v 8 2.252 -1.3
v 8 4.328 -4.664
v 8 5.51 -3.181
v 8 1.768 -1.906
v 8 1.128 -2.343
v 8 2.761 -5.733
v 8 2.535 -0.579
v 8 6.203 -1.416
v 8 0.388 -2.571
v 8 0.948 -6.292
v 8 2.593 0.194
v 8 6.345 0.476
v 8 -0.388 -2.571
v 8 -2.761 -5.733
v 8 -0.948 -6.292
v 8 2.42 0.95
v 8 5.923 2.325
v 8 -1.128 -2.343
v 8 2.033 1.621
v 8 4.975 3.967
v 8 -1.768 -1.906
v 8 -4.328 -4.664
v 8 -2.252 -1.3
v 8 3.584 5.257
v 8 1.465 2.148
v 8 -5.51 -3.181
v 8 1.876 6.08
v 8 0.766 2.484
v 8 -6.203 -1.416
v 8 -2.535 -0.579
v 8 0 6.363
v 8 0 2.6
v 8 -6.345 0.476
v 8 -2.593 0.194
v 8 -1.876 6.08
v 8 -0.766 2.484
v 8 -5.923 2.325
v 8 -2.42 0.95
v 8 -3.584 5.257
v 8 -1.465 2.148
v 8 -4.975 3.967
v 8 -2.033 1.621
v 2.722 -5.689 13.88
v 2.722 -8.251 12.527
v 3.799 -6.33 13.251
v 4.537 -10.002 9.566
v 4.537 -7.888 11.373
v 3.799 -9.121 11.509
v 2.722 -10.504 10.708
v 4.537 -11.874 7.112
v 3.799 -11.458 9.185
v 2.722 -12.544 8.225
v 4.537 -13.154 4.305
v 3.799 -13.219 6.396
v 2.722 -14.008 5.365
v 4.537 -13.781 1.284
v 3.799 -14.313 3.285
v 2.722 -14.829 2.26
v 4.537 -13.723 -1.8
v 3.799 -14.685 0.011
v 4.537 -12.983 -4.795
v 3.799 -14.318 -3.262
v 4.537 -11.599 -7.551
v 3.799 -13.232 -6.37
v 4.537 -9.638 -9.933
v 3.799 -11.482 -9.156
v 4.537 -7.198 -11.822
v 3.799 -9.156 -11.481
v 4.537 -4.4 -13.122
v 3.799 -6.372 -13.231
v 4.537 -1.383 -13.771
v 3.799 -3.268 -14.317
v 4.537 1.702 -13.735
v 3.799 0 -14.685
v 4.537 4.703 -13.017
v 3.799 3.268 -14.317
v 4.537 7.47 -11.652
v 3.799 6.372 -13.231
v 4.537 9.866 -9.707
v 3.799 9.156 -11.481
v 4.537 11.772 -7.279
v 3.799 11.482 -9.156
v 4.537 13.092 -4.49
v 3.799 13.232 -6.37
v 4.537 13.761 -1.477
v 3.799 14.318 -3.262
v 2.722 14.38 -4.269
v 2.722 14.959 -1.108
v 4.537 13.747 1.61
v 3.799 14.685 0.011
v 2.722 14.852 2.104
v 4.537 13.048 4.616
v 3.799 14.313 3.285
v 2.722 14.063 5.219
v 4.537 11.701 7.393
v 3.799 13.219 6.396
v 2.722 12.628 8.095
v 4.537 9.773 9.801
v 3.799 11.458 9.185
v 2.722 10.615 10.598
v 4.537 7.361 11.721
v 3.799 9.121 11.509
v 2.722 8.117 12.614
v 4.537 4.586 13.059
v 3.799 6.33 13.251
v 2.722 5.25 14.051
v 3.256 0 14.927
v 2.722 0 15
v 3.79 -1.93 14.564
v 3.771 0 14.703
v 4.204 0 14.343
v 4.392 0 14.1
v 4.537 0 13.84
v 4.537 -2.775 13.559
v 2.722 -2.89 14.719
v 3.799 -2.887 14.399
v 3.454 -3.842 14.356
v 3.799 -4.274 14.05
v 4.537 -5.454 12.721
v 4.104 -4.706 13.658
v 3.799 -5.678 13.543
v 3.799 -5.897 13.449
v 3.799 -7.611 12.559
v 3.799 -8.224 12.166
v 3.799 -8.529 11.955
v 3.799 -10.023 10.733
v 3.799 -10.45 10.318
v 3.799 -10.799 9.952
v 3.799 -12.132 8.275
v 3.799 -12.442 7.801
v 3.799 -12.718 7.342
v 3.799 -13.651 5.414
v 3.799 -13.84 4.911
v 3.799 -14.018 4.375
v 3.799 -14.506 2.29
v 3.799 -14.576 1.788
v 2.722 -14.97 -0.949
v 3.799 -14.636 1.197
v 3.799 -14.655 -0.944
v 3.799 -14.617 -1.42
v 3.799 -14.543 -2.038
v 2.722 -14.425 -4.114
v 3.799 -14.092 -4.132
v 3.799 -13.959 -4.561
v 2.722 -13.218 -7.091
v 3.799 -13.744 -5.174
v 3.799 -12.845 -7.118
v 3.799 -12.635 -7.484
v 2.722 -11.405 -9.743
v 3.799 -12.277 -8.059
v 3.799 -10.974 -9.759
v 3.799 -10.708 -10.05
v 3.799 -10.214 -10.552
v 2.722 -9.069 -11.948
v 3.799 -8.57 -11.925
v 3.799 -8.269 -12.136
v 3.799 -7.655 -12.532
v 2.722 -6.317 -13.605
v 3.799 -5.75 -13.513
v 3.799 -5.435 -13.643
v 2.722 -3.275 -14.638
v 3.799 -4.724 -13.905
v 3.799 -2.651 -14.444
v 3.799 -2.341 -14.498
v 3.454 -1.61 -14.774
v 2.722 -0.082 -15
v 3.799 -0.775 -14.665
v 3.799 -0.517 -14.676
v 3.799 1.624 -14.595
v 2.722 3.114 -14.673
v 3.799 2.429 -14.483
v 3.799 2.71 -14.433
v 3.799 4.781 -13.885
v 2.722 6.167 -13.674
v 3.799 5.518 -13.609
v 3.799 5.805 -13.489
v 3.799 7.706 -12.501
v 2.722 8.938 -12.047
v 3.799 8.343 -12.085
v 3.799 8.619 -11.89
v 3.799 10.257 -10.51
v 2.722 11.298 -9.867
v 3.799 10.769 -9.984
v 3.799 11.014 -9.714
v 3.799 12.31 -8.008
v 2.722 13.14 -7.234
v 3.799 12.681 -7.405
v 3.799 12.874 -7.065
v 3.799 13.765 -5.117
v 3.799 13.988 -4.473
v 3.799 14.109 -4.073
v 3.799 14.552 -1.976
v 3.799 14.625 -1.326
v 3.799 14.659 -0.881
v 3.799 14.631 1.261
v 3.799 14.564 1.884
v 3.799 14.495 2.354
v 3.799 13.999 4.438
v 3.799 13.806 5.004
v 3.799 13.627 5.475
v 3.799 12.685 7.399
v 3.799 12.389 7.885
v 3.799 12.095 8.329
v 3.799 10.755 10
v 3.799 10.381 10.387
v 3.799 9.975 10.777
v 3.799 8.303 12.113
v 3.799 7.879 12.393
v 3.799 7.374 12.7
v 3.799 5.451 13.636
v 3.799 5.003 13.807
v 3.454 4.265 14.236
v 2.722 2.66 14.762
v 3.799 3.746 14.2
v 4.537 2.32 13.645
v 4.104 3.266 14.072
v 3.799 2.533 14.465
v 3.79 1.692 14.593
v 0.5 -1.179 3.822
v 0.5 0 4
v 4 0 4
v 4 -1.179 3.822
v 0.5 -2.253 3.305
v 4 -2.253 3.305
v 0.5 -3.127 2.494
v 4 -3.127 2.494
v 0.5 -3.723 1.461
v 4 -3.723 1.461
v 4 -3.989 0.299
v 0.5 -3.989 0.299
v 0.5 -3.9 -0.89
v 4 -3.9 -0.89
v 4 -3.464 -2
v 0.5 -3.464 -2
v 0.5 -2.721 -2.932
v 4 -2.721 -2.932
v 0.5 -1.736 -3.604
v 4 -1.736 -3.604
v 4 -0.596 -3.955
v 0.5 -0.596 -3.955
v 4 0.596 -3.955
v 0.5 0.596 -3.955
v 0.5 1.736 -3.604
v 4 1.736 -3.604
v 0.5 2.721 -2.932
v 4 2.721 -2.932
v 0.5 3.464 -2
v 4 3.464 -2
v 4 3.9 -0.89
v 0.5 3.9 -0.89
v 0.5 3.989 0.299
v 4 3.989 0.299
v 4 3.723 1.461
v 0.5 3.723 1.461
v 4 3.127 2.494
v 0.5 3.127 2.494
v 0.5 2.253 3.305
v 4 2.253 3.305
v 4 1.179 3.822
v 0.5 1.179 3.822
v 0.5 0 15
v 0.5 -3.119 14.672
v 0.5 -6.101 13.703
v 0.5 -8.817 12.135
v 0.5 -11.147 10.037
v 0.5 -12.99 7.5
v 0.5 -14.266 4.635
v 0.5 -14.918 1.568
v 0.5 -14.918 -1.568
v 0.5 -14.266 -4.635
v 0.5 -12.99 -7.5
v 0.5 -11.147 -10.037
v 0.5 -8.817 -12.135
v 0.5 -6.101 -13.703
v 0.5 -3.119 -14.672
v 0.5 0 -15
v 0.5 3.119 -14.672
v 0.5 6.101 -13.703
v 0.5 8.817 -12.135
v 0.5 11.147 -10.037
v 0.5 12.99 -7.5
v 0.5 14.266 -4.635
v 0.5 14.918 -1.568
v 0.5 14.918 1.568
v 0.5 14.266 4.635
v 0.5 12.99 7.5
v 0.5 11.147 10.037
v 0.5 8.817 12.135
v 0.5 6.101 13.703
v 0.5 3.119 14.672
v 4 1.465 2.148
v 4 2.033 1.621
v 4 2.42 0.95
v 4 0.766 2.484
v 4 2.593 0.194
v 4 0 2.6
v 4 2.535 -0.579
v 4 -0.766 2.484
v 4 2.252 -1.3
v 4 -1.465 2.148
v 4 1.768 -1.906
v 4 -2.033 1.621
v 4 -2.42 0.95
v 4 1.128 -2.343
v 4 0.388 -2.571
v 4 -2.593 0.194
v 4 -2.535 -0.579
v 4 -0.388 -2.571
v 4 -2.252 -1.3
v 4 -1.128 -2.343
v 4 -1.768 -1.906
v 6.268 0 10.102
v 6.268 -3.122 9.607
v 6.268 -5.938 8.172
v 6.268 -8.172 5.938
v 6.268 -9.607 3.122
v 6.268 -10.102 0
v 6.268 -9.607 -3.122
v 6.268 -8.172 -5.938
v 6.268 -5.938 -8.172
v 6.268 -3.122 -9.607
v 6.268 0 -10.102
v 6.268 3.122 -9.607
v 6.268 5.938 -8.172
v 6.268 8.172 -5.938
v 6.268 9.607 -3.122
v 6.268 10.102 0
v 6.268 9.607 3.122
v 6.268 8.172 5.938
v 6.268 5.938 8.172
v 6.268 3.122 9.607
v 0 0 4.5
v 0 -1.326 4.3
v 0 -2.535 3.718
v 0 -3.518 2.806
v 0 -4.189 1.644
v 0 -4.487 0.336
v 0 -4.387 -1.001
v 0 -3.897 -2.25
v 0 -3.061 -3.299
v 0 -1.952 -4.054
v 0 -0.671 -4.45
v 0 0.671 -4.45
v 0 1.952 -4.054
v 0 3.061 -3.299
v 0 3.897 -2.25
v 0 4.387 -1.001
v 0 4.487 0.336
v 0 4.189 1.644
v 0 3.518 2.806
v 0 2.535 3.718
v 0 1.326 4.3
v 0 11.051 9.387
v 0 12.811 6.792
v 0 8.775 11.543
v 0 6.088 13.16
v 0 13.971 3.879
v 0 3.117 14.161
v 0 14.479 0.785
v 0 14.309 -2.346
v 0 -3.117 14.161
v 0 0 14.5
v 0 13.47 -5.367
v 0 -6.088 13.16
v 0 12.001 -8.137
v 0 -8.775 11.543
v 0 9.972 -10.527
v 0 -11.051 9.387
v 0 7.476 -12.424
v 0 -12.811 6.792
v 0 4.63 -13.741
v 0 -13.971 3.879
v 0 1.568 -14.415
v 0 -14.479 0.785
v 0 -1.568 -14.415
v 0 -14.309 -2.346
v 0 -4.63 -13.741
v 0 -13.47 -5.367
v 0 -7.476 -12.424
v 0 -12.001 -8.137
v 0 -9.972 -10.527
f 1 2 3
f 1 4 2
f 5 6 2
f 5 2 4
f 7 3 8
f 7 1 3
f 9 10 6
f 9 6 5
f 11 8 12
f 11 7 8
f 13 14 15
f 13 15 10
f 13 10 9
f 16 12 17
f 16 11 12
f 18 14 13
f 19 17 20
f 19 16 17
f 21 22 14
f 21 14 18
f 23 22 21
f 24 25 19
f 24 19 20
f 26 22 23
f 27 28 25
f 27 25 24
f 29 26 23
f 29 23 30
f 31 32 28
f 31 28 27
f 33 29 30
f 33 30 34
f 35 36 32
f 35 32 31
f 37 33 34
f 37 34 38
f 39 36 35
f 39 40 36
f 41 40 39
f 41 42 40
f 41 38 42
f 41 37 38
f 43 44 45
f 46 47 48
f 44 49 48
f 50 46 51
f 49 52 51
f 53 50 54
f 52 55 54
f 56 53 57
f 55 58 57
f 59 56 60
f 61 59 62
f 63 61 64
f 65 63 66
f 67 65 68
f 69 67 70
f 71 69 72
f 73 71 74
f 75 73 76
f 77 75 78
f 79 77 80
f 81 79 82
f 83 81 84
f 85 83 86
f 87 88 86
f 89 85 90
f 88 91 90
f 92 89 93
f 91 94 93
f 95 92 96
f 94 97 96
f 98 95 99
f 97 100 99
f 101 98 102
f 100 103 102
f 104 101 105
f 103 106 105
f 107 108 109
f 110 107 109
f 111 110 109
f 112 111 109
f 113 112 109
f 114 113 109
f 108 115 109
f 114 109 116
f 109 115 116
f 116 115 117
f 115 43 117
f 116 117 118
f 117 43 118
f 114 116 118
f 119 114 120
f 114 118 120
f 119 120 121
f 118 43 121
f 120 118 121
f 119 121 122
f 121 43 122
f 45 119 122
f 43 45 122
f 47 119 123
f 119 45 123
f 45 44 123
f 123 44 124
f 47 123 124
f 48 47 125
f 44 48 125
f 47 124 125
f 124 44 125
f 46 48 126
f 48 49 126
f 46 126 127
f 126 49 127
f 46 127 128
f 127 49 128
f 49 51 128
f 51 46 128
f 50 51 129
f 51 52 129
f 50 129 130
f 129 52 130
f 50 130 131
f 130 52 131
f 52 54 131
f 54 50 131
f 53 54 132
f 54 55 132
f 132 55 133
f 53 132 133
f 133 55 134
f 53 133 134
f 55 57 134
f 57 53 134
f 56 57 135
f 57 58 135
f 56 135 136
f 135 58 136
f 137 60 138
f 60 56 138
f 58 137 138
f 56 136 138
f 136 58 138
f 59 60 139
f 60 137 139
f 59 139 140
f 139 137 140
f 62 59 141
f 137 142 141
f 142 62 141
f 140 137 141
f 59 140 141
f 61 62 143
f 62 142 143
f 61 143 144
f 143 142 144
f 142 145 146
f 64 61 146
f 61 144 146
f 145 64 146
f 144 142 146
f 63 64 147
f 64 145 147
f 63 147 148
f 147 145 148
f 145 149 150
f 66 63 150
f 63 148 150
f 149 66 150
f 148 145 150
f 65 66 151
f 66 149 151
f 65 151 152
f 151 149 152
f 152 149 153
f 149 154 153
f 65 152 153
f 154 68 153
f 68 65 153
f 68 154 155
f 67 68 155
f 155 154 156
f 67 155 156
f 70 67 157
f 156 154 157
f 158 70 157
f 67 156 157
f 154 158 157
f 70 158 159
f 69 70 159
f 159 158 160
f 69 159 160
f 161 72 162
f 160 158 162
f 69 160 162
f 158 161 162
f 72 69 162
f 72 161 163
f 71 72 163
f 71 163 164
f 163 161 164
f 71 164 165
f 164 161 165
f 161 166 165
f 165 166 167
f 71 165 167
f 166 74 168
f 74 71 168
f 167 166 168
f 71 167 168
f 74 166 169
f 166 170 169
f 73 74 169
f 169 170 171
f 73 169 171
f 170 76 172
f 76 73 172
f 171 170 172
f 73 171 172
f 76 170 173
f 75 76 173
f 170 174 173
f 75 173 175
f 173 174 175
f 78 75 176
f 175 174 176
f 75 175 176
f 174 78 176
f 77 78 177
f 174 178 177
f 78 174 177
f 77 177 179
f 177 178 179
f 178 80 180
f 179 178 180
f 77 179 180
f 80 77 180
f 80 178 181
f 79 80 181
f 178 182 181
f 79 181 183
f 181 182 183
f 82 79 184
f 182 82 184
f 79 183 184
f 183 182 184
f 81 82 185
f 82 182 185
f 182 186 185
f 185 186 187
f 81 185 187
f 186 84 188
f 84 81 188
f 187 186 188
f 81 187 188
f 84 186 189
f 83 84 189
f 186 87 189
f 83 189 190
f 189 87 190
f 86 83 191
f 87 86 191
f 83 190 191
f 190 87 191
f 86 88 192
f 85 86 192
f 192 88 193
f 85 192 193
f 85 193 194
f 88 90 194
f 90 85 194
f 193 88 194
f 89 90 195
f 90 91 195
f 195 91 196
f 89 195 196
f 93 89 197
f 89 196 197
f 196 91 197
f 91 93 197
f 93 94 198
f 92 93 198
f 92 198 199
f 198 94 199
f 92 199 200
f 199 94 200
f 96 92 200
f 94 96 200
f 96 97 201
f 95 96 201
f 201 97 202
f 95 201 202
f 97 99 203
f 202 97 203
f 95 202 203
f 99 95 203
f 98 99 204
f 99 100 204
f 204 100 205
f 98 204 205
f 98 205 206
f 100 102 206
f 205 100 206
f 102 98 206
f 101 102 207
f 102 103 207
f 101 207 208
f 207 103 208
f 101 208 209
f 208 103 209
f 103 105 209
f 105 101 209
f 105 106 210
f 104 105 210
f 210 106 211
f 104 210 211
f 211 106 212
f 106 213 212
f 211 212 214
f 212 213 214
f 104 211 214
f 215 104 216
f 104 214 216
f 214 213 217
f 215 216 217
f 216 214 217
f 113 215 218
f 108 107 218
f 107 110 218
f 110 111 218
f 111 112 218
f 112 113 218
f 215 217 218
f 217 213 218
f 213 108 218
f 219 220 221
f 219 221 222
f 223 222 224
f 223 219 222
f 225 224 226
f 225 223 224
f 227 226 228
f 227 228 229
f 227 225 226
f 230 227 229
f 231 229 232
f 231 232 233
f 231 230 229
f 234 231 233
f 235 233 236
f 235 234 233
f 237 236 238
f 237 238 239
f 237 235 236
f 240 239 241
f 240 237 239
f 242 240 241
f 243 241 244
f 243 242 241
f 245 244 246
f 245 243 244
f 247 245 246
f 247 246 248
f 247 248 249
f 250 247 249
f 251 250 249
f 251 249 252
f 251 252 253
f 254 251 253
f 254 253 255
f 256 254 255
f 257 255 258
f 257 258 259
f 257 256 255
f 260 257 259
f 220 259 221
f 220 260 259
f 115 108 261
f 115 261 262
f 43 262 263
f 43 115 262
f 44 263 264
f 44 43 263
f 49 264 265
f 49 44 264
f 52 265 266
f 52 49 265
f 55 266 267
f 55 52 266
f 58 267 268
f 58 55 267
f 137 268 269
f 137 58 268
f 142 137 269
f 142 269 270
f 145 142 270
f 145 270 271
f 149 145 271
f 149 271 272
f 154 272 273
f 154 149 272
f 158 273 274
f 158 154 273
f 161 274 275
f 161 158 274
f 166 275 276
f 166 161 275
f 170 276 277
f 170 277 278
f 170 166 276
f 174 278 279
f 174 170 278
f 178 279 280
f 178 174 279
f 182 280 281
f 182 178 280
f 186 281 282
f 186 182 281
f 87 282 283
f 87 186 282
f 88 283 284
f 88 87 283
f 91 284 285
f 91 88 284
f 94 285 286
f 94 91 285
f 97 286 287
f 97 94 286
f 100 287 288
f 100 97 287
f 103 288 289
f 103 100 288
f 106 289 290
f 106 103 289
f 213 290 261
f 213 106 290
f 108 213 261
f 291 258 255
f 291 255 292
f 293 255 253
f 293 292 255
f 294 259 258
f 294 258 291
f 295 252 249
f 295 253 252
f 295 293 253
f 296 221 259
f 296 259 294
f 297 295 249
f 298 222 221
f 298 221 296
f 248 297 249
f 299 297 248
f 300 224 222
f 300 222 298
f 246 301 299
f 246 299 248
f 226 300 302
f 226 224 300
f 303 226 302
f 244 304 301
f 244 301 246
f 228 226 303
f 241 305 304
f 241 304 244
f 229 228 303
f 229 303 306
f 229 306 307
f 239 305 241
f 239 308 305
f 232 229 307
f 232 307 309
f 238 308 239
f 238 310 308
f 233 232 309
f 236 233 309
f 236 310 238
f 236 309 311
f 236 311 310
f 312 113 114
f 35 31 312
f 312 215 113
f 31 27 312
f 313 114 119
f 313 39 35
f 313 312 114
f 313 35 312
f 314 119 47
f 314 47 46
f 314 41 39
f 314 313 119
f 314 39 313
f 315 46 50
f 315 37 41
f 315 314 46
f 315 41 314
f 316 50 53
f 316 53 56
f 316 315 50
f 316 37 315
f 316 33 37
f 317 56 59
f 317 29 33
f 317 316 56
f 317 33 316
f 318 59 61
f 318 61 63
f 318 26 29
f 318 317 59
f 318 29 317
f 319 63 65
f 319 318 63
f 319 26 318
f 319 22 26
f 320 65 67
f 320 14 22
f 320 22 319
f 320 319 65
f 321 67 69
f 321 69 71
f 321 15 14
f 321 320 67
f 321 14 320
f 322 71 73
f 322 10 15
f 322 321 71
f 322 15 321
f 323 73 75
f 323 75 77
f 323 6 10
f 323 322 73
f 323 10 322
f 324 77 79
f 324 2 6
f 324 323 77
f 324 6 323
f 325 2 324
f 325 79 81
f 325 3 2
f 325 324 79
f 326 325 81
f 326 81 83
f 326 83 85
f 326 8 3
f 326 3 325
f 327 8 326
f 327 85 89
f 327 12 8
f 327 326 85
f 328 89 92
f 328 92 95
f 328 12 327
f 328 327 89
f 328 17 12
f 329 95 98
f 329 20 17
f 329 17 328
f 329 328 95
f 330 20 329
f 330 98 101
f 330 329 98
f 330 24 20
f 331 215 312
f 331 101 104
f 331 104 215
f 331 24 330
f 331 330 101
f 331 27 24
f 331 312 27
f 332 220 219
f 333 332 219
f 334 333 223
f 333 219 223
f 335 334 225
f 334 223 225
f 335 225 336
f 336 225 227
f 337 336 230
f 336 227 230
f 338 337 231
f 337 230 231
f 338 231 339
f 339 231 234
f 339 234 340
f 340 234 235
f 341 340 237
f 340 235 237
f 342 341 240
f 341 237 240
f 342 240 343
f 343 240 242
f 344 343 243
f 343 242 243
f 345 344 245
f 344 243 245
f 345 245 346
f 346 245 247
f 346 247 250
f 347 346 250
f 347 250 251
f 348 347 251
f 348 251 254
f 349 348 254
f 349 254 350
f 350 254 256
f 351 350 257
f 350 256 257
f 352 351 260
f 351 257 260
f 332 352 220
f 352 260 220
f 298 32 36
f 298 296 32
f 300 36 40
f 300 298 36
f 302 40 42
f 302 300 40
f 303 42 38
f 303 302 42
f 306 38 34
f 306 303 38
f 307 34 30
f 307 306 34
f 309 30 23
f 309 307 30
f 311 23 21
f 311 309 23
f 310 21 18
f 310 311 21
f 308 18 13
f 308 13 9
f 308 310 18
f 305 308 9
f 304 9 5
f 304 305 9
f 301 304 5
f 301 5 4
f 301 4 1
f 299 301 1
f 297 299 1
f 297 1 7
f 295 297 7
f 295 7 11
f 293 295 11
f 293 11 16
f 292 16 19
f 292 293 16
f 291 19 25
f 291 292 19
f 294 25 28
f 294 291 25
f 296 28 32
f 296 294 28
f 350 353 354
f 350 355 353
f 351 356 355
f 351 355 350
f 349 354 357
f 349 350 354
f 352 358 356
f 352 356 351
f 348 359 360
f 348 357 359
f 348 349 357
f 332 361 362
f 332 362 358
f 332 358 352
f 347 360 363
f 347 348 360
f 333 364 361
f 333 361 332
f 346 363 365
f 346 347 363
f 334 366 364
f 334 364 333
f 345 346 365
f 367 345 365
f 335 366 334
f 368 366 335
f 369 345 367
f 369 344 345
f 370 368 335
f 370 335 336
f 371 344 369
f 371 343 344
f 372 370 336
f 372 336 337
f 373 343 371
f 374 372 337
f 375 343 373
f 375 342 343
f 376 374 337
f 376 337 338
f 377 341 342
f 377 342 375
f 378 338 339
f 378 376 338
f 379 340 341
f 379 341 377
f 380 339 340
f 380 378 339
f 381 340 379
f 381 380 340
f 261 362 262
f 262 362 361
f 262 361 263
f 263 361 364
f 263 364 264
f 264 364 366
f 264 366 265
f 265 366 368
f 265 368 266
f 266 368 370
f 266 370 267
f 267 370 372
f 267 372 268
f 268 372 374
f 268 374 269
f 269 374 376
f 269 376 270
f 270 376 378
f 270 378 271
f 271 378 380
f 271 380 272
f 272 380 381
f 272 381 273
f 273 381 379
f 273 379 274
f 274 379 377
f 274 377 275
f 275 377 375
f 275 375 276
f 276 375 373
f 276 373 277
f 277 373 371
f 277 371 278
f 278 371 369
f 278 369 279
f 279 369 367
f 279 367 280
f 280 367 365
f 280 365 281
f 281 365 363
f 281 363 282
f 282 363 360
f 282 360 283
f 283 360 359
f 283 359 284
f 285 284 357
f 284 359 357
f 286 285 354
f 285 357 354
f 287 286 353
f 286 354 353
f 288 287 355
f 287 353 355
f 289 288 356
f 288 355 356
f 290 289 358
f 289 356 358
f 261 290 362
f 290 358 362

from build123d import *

# Parameters (mm, degrees)
FILLET1_R     = 2
CHAMFER1_SIZE = 0.5


with BuildPart() as part:
    # Sketch1 → Revolve1 (revolve)
    with BuildSketch(Plane.XY, mode=Mode.PRIVATE) as revolve1_sk:
        Polygon((0, 4), (0, 15), (4, 15), (8, 6.362924355), (8, 2.6), (4, 2.6), (4, 4), align=None)
    revolve(revolve1_sk.sketch.rotate(Axis((0, 0, 0), (1, 0, 0)), 90), axis=Axis((0, 0, 0), (1, 0, 0)))

    # Fillet1
    fillet1_edges = [part.edges().sort_by_distance(p)[0] for p in [
        (4, 0, -15),
    ]]
    fillet(fillet1_edges, radius=FILLET1_R)

    # Chamfer1
    chamfer1_edges = [part.edges().sort_by_distance(p)[0] for p in [
        (0, 0, -15),
        (0, 0, -4),
    ]]
    chamfer(chamfer1_edges, length=CHAMFER1_SIZE)


solid = part.part
